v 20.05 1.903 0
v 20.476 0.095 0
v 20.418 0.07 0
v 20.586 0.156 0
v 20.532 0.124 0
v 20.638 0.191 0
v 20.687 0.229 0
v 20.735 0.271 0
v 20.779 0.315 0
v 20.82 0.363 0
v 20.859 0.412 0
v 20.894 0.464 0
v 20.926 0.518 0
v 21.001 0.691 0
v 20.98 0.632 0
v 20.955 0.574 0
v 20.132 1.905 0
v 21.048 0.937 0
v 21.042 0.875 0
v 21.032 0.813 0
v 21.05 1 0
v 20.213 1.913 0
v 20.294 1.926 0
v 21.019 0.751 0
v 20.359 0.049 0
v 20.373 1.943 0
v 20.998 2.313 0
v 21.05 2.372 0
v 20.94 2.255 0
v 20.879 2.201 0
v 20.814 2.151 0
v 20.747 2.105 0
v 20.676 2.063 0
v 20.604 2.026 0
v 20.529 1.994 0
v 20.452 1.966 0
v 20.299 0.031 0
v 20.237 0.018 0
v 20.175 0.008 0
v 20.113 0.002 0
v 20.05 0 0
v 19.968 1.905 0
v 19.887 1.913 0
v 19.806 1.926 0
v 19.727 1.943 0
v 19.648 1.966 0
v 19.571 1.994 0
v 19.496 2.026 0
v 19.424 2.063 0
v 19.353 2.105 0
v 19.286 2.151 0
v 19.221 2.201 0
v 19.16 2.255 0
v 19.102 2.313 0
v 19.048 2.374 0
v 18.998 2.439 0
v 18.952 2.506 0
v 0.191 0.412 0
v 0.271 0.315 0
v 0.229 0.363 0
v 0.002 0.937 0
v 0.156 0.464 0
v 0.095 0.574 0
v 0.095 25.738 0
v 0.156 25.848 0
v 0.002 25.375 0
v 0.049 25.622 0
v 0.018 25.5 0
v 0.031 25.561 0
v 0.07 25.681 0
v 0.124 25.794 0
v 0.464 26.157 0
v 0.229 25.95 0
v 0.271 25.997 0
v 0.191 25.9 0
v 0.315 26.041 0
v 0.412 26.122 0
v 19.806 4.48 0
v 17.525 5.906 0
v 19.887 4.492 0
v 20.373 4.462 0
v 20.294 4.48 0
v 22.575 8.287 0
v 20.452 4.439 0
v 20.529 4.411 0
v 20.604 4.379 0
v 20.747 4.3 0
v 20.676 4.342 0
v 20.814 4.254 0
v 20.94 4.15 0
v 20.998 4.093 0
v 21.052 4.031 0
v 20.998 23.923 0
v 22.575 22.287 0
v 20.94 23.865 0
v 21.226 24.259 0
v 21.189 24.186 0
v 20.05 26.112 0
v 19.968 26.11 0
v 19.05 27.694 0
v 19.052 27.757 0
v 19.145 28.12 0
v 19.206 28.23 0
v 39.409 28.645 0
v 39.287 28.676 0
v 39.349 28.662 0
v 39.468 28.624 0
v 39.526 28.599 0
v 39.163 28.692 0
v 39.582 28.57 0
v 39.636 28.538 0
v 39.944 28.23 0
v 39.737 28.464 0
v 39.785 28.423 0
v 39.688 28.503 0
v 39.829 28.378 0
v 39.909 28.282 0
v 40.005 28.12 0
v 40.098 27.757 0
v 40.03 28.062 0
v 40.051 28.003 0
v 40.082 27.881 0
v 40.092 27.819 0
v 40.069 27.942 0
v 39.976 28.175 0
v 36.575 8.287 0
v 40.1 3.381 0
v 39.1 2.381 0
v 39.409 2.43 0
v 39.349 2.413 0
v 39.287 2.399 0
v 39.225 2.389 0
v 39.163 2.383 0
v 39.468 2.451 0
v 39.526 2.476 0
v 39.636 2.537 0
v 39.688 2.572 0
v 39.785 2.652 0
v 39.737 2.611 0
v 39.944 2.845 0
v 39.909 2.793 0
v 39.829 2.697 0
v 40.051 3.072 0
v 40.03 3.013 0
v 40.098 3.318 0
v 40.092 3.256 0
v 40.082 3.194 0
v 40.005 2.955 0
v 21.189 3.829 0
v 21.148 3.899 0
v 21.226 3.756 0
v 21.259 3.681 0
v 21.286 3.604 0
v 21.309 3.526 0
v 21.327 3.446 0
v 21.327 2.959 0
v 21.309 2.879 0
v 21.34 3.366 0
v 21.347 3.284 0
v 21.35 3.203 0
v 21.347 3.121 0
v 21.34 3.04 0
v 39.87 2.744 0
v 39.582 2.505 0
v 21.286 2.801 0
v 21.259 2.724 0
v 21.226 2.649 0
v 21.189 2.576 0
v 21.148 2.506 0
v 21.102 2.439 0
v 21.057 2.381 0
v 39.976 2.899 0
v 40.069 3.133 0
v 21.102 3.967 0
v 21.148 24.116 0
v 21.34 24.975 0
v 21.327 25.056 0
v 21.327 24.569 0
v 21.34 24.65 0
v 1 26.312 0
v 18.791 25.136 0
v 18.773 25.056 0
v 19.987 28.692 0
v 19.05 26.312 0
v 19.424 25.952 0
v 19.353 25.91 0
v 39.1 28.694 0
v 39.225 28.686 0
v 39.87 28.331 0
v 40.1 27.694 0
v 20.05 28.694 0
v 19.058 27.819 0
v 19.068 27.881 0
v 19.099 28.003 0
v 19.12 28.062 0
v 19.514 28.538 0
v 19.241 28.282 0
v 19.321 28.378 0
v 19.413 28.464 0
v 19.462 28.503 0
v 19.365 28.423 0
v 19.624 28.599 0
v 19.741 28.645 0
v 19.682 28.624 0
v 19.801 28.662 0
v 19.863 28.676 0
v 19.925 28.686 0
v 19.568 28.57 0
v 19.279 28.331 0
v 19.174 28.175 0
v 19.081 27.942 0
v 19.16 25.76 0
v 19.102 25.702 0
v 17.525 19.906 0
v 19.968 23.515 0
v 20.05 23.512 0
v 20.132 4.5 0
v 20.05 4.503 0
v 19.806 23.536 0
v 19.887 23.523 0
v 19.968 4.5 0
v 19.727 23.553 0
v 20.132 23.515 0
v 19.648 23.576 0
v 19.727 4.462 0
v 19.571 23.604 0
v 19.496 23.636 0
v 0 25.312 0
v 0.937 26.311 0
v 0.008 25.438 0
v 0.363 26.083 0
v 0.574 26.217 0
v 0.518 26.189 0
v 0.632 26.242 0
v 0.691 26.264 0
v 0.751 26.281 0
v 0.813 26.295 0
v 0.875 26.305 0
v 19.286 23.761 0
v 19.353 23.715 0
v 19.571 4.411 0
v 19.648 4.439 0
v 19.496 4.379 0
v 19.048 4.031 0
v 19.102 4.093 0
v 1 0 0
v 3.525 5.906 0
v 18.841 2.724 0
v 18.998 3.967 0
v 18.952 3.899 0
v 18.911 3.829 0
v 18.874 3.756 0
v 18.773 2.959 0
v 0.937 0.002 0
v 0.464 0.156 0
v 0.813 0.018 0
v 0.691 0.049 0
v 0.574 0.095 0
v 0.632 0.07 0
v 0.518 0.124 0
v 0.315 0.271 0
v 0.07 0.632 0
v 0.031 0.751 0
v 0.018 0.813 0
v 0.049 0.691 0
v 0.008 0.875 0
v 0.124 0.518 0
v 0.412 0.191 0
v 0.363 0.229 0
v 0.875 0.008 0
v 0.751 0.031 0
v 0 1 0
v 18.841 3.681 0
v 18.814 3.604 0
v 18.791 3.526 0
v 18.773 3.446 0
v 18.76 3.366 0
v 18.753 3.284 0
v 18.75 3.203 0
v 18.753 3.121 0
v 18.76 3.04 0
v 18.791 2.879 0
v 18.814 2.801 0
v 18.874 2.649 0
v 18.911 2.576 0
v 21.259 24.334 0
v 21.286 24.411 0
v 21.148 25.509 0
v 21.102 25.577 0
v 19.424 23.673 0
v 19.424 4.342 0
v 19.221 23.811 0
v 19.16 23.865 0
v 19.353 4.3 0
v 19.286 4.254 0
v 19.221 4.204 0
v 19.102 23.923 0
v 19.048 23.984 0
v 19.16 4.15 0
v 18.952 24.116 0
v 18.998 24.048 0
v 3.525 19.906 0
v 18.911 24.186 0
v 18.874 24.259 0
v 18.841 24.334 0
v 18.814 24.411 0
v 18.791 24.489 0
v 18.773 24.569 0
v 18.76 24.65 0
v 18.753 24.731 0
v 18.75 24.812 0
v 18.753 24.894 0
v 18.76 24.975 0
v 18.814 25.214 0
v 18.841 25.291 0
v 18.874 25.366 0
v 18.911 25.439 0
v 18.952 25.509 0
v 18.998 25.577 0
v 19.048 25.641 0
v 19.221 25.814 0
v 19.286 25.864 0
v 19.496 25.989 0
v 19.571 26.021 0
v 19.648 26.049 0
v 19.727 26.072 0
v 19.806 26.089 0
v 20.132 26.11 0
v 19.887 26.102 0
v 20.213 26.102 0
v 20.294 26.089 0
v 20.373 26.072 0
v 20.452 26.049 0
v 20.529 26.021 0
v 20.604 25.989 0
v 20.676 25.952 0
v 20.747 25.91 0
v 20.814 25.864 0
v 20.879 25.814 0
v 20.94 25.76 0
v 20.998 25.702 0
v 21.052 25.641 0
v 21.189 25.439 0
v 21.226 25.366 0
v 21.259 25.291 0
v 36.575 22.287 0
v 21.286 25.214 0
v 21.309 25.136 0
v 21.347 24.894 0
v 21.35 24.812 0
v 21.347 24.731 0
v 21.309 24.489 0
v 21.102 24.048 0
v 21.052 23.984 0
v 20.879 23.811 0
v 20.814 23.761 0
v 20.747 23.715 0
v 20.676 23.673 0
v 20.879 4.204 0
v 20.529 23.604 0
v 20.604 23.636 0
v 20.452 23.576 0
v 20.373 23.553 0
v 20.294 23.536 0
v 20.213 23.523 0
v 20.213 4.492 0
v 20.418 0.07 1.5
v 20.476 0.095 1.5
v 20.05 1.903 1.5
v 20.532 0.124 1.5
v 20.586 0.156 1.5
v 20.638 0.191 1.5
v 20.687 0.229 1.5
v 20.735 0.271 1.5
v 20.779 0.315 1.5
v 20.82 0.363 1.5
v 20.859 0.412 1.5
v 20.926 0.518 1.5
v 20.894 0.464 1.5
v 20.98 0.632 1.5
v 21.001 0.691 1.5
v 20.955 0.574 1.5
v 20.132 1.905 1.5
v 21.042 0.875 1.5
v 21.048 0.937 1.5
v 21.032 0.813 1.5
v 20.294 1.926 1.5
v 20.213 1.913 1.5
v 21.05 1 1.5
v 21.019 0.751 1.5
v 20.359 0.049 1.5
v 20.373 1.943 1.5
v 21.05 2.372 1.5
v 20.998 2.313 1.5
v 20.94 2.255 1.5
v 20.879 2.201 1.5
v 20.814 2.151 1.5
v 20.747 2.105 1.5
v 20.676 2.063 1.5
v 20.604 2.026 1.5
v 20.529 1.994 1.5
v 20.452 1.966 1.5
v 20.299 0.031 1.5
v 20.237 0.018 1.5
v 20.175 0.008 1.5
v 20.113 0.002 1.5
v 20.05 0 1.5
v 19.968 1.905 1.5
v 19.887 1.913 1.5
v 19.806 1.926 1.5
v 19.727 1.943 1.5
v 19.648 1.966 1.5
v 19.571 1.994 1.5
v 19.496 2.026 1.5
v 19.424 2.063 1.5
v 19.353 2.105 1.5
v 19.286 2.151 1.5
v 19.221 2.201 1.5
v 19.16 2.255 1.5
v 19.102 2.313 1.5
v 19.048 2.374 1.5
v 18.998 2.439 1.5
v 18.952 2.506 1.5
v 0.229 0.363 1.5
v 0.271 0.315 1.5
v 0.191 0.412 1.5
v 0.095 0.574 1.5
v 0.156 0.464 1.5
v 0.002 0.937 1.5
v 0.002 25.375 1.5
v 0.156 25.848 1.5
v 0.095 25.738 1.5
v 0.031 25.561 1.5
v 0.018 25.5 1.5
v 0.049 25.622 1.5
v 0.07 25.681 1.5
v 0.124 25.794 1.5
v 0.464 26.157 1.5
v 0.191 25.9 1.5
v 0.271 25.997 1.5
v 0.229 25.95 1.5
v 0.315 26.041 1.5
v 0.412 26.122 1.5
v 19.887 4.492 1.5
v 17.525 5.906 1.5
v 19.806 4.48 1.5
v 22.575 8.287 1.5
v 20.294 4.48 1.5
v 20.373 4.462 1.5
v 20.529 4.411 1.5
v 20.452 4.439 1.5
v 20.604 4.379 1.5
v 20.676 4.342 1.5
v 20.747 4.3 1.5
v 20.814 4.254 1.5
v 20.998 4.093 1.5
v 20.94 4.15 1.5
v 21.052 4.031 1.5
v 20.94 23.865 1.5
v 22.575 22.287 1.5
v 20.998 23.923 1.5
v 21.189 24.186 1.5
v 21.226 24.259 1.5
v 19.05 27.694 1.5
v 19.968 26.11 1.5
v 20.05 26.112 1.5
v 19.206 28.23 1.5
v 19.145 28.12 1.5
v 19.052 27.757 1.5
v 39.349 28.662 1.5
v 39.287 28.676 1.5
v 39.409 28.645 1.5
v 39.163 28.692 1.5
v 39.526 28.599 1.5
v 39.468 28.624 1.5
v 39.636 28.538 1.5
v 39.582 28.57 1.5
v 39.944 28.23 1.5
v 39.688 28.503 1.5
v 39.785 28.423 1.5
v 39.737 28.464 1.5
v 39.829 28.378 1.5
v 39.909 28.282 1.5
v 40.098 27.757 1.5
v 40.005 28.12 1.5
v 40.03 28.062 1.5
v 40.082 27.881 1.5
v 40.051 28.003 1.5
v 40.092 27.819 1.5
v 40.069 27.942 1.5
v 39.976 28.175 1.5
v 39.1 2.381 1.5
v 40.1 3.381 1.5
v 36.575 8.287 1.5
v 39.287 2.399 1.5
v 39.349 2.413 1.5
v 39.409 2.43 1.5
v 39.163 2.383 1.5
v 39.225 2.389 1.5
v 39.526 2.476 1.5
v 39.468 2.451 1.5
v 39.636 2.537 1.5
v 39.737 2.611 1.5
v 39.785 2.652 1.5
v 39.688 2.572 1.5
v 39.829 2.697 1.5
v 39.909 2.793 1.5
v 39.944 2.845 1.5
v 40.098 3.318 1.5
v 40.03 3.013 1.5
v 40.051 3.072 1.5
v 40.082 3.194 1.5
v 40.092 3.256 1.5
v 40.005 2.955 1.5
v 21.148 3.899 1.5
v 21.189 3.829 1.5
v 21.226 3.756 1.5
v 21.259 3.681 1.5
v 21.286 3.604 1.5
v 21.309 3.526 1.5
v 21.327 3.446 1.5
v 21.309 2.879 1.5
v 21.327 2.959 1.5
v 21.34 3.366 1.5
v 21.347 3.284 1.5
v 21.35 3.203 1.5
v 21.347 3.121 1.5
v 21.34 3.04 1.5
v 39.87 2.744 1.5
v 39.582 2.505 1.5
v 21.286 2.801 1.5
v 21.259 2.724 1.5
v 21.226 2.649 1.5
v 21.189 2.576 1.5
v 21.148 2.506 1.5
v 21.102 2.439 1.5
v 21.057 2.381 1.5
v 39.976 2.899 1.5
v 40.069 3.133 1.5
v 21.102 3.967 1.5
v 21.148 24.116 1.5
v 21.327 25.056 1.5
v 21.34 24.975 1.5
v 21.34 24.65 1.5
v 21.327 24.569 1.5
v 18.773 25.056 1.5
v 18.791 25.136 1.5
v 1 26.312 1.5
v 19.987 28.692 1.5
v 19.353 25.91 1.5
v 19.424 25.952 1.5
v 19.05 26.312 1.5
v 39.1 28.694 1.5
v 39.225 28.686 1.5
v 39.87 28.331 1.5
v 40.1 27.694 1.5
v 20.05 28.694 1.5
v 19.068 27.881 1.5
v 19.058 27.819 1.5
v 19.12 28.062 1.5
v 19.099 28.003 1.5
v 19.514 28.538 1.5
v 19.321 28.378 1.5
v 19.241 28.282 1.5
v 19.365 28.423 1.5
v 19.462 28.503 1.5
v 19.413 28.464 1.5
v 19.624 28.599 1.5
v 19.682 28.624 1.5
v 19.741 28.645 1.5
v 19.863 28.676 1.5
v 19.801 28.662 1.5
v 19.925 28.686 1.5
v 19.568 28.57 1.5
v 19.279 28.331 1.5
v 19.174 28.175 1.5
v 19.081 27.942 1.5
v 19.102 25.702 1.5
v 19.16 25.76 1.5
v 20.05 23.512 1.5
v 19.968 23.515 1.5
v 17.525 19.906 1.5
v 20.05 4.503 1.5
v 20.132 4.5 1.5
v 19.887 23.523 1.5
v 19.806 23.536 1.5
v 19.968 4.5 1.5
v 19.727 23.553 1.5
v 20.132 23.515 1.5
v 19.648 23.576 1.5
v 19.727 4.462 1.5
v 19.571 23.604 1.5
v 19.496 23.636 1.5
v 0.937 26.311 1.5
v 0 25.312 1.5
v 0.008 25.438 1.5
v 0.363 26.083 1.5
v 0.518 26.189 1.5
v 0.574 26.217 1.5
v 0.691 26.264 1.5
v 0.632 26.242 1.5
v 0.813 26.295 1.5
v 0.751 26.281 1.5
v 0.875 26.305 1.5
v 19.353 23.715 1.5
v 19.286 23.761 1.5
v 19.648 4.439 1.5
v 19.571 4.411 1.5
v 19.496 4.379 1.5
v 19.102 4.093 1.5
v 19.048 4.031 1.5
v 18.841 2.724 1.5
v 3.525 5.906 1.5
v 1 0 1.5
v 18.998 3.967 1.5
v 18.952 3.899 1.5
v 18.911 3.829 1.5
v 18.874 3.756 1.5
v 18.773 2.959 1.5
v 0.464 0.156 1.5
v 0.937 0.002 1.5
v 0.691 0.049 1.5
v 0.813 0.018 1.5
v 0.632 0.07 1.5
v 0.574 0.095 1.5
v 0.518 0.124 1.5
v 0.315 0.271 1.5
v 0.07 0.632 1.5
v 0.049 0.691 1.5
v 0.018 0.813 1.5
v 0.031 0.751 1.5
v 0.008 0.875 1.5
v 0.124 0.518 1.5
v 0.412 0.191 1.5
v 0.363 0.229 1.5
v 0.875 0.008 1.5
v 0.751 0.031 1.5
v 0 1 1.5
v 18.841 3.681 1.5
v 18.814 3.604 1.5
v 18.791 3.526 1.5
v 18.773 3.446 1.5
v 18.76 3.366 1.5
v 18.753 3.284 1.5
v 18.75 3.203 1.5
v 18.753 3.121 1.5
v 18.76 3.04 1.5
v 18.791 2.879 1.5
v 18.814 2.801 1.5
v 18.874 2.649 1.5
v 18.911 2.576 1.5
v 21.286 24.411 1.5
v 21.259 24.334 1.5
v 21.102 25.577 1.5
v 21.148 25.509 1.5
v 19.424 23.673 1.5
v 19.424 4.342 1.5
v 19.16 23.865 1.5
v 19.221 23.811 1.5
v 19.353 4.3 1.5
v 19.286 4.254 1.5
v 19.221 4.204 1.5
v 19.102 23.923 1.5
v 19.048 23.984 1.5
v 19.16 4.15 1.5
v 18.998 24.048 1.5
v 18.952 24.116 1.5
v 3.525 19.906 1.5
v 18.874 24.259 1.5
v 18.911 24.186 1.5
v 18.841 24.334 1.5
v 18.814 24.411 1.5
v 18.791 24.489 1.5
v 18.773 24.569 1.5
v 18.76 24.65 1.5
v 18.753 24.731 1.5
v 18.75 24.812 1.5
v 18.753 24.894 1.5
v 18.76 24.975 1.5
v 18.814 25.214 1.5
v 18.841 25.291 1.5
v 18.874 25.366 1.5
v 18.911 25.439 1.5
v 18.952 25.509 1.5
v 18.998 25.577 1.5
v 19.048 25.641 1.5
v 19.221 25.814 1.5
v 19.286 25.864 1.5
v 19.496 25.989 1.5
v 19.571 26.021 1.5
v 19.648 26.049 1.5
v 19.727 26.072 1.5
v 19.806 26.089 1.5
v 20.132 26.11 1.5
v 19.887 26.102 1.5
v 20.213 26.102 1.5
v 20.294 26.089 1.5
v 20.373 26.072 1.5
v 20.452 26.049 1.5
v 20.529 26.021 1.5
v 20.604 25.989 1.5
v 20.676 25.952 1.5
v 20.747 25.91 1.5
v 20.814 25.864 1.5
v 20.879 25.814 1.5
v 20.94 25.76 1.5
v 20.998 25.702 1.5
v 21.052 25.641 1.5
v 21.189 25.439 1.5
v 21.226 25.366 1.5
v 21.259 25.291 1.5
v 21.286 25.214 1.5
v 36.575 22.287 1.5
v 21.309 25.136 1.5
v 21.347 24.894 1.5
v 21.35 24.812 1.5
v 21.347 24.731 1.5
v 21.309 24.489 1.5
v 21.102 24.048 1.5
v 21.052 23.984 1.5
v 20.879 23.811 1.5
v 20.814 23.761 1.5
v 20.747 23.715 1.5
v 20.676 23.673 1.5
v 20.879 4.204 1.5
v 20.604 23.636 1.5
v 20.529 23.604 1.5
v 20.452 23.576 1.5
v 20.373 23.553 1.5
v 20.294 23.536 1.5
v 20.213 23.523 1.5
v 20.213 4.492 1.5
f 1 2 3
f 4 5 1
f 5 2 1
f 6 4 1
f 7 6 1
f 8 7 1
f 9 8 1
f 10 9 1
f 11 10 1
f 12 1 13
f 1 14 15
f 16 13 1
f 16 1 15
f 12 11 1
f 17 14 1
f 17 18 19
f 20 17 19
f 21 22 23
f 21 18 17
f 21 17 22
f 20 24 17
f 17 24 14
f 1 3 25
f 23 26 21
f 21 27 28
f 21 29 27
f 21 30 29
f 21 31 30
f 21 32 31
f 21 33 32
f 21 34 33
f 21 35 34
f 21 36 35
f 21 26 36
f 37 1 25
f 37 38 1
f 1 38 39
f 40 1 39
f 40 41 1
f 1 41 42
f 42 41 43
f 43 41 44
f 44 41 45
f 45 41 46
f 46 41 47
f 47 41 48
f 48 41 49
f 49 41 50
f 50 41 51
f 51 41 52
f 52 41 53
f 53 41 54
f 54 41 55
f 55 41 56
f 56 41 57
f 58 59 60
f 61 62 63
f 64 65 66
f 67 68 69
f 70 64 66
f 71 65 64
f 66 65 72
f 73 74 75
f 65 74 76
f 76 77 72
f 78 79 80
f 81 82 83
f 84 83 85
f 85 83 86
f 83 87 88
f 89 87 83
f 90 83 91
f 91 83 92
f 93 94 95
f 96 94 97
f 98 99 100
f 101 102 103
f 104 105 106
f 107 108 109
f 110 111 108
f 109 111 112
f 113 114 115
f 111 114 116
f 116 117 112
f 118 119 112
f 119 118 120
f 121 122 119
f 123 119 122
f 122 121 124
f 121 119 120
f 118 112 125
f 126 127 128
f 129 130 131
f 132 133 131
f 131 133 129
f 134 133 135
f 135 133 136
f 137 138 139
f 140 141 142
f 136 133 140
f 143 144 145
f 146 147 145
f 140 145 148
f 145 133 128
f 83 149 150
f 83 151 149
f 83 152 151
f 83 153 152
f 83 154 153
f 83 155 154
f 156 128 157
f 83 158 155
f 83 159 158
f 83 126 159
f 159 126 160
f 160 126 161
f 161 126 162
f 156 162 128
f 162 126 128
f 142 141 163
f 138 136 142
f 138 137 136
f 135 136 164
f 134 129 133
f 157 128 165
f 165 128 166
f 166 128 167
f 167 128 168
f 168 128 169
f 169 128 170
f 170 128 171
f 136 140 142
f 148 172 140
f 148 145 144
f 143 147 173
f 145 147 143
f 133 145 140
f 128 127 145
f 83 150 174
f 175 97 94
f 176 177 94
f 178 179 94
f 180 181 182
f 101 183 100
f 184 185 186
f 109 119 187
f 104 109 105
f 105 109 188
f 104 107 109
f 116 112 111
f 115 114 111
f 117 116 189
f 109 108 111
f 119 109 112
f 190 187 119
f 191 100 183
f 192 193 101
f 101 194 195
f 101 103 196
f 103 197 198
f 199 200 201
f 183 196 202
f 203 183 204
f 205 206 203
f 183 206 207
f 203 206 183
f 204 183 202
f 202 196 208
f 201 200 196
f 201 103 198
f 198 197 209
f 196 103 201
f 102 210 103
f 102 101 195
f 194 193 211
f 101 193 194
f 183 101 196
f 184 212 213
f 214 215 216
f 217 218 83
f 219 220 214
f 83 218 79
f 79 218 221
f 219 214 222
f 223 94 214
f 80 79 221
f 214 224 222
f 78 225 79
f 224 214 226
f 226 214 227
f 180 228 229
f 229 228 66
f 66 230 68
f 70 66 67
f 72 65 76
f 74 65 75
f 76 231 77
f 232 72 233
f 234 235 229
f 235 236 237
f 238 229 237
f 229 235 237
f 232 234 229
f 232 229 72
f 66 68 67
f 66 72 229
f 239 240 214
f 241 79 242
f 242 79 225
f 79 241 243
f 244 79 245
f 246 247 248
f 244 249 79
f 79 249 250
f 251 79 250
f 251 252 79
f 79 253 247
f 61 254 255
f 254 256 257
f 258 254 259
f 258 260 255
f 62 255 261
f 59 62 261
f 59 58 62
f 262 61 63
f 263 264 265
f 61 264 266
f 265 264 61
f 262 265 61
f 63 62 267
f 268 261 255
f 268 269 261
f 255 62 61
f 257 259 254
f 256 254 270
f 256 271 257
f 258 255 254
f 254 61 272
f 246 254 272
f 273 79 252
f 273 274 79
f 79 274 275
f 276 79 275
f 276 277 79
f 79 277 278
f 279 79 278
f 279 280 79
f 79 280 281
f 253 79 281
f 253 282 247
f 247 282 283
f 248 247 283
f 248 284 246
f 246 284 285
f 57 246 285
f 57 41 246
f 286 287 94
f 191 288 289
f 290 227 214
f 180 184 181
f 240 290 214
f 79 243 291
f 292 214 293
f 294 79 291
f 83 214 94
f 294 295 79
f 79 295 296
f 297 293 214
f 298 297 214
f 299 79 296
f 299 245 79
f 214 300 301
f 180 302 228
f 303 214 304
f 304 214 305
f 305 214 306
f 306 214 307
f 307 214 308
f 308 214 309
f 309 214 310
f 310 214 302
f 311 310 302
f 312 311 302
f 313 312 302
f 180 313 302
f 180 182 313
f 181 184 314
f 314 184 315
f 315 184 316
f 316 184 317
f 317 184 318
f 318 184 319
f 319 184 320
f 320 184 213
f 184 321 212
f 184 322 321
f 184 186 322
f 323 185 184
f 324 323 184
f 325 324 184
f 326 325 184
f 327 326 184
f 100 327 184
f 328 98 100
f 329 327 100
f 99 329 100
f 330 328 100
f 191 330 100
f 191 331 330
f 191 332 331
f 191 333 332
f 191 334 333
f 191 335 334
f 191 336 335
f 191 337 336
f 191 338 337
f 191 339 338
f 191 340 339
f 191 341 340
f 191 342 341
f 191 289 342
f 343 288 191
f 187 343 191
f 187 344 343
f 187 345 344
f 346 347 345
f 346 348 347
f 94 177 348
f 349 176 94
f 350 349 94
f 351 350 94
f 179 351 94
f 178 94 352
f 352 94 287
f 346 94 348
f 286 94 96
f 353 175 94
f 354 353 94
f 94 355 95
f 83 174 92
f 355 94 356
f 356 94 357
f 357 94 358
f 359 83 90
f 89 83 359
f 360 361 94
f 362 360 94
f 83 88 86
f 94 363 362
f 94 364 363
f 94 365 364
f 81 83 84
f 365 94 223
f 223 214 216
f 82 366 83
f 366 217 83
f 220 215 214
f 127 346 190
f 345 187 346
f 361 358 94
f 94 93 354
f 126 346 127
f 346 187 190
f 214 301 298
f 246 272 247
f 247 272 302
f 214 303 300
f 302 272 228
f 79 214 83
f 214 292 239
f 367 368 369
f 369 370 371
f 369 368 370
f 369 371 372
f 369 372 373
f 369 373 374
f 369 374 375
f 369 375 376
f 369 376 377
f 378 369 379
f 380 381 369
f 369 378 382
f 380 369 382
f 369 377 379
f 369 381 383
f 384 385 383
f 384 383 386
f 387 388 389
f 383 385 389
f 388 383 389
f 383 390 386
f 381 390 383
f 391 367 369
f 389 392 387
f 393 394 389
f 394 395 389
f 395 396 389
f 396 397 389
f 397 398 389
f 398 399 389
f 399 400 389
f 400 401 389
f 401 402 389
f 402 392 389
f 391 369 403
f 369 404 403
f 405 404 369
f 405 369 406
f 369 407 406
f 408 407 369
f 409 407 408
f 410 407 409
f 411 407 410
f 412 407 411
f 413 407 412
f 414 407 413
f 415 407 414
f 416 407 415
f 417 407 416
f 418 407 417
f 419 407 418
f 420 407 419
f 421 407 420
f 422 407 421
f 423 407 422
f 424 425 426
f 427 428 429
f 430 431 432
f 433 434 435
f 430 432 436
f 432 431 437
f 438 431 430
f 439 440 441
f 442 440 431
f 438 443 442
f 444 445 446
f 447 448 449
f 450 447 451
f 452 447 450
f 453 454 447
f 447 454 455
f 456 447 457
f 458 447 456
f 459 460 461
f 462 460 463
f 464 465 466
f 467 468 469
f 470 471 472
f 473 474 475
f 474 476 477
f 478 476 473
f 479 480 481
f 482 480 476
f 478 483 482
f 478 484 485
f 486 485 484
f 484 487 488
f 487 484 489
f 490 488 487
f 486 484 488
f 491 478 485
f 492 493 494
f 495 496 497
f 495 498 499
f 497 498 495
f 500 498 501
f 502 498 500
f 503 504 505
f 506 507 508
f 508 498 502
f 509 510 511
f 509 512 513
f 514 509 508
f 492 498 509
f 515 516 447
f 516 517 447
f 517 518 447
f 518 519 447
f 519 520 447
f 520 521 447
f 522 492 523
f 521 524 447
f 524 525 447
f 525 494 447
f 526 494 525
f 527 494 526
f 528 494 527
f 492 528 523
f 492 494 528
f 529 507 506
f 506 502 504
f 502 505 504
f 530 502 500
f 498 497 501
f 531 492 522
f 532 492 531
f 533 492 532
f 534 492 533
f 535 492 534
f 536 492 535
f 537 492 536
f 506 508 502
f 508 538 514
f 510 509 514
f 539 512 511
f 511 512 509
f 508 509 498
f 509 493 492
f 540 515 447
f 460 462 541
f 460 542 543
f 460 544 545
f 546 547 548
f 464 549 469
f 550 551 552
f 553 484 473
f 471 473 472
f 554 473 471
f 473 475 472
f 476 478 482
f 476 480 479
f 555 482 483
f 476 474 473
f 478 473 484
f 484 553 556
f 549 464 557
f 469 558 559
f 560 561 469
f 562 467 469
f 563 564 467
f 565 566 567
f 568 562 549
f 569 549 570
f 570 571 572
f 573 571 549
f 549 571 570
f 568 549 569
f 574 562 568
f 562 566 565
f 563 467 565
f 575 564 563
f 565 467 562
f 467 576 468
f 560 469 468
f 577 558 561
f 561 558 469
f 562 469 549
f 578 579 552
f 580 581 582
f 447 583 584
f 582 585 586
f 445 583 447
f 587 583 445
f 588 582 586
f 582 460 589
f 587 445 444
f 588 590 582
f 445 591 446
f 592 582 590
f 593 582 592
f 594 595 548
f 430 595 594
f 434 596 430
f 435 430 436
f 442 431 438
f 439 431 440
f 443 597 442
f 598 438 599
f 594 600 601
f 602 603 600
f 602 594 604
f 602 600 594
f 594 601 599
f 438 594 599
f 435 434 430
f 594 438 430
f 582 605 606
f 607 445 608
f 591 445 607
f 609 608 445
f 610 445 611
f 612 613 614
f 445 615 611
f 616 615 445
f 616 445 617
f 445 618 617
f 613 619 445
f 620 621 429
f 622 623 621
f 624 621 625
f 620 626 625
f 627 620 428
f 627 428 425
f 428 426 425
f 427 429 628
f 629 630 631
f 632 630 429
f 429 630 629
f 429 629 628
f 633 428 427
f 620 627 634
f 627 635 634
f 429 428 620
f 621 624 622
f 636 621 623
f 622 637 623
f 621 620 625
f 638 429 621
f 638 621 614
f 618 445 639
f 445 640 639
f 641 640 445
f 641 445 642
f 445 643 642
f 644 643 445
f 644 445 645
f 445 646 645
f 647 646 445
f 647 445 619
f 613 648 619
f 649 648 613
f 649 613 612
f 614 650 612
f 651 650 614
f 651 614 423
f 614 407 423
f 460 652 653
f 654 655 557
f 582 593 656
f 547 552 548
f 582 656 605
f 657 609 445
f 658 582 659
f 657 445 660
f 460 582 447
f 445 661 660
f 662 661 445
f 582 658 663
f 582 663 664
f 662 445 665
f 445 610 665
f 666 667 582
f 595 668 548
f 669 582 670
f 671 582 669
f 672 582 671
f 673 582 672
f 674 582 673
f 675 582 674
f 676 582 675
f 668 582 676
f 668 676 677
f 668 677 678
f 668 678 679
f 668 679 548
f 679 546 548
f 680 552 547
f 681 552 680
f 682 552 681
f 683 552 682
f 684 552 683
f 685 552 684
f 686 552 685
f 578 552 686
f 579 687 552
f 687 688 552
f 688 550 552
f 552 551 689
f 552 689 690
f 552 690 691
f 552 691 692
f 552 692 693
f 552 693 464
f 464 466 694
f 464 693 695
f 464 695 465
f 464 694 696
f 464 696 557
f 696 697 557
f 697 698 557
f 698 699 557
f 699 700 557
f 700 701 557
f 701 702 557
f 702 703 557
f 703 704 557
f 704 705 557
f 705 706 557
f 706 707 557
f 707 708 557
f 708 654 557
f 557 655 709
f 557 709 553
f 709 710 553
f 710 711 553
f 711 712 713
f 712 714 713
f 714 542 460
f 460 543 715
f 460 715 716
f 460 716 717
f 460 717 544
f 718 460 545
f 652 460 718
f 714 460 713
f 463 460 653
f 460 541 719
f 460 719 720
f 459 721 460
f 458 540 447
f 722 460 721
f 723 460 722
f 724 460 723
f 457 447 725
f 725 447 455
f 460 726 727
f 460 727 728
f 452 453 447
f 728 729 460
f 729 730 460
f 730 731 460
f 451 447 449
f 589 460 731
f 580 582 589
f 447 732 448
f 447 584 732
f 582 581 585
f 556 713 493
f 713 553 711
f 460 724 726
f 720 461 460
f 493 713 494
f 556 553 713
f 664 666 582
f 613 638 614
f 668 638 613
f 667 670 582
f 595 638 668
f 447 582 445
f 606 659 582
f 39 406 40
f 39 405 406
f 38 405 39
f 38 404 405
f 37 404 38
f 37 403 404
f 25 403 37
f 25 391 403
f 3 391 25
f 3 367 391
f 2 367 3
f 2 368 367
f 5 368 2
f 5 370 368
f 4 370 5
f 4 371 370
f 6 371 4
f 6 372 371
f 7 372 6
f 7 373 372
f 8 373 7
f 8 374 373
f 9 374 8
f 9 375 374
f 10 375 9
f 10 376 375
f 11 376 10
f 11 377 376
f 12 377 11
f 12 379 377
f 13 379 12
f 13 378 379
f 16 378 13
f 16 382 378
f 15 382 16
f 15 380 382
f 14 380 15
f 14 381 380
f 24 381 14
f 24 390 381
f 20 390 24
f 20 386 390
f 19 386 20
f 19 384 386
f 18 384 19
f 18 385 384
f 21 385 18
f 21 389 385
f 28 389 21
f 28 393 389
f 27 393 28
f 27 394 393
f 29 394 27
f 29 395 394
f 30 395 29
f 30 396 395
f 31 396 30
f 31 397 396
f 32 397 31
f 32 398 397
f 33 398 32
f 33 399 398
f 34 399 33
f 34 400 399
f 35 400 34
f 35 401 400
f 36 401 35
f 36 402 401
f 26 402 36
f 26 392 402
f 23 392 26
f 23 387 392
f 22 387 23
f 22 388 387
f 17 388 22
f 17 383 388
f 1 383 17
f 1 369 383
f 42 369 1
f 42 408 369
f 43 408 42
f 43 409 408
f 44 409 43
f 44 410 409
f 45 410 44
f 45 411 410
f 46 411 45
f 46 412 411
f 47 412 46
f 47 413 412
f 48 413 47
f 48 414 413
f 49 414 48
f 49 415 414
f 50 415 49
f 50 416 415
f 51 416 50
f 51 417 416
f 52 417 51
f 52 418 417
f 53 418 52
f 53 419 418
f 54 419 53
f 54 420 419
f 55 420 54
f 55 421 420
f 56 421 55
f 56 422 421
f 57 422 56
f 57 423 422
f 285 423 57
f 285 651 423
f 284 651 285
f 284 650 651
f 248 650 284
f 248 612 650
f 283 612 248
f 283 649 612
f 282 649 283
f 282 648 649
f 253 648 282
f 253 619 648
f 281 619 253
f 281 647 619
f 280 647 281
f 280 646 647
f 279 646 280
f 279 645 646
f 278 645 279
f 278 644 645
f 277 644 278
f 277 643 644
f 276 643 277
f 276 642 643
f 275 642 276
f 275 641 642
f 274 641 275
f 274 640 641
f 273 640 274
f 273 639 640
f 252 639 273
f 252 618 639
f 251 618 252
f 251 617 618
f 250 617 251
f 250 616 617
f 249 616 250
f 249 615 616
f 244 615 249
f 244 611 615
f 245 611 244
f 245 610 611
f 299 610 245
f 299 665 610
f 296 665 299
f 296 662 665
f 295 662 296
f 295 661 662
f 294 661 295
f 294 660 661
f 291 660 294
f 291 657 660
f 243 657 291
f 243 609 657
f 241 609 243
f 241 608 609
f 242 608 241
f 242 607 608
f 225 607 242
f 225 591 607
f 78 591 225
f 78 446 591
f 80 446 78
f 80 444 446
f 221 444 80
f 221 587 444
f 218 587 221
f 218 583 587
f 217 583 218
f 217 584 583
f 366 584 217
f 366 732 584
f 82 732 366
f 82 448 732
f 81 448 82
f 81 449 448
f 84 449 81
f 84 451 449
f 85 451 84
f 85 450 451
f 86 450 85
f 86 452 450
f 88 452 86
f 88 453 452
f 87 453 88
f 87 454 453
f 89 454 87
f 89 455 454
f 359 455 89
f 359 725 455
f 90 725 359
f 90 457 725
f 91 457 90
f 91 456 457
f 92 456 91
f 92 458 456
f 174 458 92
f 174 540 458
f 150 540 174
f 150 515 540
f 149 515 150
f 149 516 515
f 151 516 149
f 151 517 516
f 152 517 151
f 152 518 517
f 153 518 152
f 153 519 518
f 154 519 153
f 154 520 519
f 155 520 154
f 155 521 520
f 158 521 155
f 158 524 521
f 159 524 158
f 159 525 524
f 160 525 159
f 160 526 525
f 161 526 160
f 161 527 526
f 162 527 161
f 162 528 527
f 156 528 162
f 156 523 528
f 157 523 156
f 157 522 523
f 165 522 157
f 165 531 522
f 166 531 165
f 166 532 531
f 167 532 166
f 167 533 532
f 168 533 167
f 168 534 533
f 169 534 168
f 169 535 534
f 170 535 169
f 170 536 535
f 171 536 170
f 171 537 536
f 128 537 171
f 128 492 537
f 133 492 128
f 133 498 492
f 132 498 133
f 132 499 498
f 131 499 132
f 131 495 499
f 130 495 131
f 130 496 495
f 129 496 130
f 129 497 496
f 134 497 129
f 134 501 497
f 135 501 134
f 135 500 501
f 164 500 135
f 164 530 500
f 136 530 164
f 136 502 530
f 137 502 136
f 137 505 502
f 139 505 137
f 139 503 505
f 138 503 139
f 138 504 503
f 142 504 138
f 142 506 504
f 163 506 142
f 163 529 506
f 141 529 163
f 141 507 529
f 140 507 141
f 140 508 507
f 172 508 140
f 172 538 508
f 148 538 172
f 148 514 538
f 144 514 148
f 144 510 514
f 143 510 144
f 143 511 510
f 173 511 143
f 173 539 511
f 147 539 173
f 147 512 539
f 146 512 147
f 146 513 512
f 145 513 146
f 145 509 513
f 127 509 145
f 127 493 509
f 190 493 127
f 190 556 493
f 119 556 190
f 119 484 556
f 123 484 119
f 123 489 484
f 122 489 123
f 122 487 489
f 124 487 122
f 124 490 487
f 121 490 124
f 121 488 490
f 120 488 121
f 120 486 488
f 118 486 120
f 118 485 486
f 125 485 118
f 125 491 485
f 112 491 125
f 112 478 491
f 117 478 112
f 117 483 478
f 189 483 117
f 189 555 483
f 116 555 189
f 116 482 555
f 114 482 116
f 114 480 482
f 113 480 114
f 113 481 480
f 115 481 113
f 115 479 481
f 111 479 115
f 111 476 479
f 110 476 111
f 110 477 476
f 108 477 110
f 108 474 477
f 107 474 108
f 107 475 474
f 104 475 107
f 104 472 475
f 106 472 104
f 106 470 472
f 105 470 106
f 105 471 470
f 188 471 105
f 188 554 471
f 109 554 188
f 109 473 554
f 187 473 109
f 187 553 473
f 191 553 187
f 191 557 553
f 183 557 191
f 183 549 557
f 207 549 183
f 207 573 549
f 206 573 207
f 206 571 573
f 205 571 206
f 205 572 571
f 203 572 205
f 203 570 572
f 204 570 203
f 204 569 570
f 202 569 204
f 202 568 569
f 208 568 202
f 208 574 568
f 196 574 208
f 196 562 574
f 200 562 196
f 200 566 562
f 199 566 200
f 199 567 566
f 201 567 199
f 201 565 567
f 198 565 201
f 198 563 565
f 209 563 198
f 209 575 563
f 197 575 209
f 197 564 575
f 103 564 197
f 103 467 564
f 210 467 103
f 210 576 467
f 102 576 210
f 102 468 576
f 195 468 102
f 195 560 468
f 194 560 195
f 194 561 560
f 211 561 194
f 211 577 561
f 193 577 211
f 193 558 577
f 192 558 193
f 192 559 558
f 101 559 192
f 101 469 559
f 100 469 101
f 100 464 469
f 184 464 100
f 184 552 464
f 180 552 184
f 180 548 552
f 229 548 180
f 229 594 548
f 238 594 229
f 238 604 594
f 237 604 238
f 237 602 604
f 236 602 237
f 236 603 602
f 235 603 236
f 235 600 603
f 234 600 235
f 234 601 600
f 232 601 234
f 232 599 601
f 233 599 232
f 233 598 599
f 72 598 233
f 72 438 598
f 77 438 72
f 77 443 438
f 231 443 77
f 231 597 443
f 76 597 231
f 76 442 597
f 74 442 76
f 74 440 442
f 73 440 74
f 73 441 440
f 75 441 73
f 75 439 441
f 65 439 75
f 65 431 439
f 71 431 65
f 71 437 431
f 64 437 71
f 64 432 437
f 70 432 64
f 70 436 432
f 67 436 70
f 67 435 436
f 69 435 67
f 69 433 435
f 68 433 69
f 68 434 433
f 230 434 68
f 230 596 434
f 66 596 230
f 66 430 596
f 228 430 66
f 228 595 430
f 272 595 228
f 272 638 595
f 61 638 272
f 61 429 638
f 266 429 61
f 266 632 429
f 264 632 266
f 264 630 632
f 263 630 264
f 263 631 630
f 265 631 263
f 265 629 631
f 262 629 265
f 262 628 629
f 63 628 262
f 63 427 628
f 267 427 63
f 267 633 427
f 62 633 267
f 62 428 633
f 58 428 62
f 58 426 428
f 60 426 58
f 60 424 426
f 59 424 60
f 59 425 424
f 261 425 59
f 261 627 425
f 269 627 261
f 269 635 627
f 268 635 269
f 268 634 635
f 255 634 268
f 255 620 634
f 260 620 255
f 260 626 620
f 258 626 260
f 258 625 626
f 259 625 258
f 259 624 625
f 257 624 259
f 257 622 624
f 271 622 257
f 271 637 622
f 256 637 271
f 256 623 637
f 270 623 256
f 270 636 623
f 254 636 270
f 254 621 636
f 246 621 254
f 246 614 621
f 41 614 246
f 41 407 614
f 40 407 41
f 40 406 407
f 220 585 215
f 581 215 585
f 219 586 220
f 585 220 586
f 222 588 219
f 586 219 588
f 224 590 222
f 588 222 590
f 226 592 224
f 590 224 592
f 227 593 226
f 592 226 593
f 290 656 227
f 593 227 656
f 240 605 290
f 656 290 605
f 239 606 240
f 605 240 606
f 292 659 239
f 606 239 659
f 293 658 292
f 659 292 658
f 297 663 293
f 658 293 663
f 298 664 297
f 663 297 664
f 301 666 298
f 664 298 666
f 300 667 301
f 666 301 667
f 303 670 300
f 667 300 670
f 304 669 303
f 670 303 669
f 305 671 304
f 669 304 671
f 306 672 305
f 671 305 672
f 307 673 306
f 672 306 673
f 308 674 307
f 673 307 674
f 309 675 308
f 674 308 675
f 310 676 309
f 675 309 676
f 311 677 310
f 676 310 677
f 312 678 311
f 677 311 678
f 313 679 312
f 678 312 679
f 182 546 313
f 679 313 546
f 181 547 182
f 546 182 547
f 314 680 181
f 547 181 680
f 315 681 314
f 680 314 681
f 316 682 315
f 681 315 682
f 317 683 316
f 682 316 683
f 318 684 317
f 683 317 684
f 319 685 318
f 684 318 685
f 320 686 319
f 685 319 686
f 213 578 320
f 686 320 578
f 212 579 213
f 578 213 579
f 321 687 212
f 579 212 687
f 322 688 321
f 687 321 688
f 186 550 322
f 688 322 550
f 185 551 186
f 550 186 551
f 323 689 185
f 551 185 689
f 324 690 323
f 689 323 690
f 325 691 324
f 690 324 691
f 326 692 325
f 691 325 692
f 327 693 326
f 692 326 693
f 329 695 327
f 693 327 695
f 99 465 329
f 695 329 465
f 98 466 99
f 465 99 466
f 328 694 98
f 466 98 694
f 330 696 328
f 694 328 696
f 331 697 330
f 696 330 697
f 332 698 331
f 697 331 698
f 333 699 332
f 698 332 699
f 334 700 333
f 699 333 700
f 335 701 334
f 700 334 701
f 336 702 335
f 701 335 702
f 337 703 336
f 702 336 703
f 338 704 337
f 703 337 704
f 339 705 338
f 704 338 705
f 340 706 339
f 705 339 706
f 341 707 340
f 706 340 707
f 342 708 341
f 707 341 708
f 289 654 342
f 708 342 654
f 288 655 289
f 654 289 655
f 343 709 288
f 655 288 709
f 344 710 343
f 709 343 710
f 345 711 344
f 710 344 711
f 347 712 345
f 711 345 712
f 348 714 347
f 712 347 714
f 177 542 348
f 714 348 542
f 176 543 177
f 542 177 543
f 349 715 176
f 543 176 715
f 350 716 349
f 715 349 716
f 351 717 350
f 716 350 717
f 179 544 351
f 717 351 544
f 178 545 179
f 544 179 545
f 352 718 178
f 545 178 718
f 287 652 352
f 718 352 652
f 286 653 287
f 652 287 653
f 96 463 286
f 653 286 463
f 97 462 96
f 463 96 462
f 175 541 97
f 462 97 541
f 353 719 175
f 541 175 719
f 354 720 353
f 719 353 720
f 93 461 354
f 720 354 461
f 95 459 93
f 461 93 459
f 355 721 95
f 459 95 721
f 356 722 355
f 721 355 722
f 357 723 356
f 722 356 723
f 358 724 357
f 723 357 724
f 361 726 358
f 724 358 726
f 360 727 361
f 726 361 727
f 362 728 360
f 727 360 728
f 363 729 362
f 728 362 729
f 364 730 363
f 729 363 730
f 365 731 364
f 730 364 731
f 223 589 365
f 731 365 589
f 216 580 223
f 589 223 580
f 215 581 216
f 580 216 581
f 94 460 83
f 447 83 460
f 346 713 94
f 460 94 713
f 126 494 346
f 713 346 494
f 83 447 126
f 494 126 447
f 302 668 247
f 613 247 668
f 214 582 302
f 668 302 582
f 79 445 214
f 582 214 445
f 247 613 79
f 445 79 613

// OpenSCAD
// file: ../modules/shapes.scad
// draws a square with rounded corners
module squircle(
    size = [1,1],
    radius = 1,
    center = false){
    
    x = size[0];
    y = size[1];
    radius = min(x/2,min(y/2, radius));
    translation = [0,0];
        
    module corner(){
            intersection(){
                square([radius,radius]);
                translate([radius, radius])
                    circle(radius);
            }
    }
    
    module body(){
    
        corner();
        
        translate([0, y])        
            rotate([0,0,-90])
                corner();
        
        translate([x, y])        
            rotate([0,0,180])
                corner();
        
        translate([x, 0])        
            rotate([0,0, 90])
                corner();
        
        translate([radius, 0])
            square([x - 2 * radius, radius]);
        
        translate([0, radius])
            square([x, y - radius * 2]);
            
        translate([radius, y - radius])
            square([x - 2 * radius, radius]);
    }
    
    if(center)
        translate([-x/2, -y/2])
            body();
    else
        body();
}
// file: ../modules/keycap.scad
use <shapes.scad>

// draws a rough no-profile at keycap 0,0 1U space
module keycap(keyHeight = 1.0){
  
    1U = 19.05;
    width = 18;
    depth = 18 * keyHeight;
    height = 9;

    translate([1U/2, 1U/2, 7])
        linear_extrude(height, scale = [0.7,0.7])
          squircle([width, depth], 1, center = true);	
}

keycap($fn = 100);
// file: ../modules/switch.scad
use <shapes.scad>;

// draws a rough Cherry MX style switch at 0,0 1U space
module switch(){
    
    ringWidth = 15.6;
    ringHeight = 1.0;

    bottomTopWidth = 14.0;
    bottomBottomWidth = 12.0;
    bottomHeight = 5.0;

    topBottomWidth = 14.5;
    topTopWidth = 10;
    topHeight = 11.6 - bottomHeight - ringHeight;

    module switch_stem(){

        width = 3.6;
        height = 3.6;
        depth = 1.2;
        edgeRadius = 0.2;

		color("FireBrick",1)
            translate([0,0, ringHeight + topHeight])
                linear_extrude(height = height){
                    squircle([width, depth], edgeRadius, true);
                    rotate([0,0,90])
                        squircle([width, depth], edgeRadius, true);
                }
    }

    module switch_top(){
		color("WhiteSmoke",1)
            translate([0,0,ringHeight])
                linear_extrude(topHeight, scale = topTopWidth / topBottomWidth)
                    translate([-topBottomWidth/2,-topBottomWidth/2,0])
                        squircle([topBottomWidth,topBottomWidth], 1.0);
    }
                    
    module switch_middle(){
		color("WhiteSmoke",1)
            linear_extrude(ringHeight)
                squircle([ringWidth, ringWidth], 1.0, center = true);
    }

    module switch_bottom(){
		color("WhiteSmoke",1)
            translate([0,0,-bottomHeight])
                linear_extrude(bottomHeight, scale = bottomTopWidth / bottomBottomWidth)
                    translate([-bottomBottomWidth/2,-bottomBottomWidth/2,0])
                        squircle([bottomBottomWidth,bottomBottomWidth], 1.0);
    }

    translate([19.05/2,19.05/2,0]){
        switch_stem();
        switch_top();
        switch_middle();
        switch_bottom();
    }
}

switch();
// file: ../modules/bearingMount.scad
include <../config.scad>;
use <./plate.scad>;

module hole(){

    linear_extrude(BEARING_BOLT_CLEARANCE_Z)
        boltHole();

    translate([0,0, BEARING_BOLT_CLEARANCE_Z])
        linear_extrude(BEARING_MOUNT_HEIGHT)
            circle(d = BOLT_TOP_DIAMETER + BOLT_TOLERENCE * 2);
}

module bearingMount(){

    trackballRadius = getTrackballHoleRadius();
    ringWidthBottom = PLATE_BEZEL + (1U - SWITCH_WIDTH) * 0.5;
    
    difference(){
        
        union(){

            rotate_extrude(convexity = 10)
                minkowski(){
                    polygon([
                        [trackballRadius + BEARING_MOUNT_TOP_CURVE_RADIUS,0],
                        [trackballRadius + ringWidthBottom - BEARING_MOUNT_TOP_CURVE_RADIUS, 0],
                        [trackballRadius - BEARING_MOUNT_TOP_CURVE_RADIUS + BEARING_MOUNT_TOP_X_MAX, BEARING_MOUNT_HEIGHT - BEARING_MOUNT_TOP_CURVE_RADIUS],
                        [trackballRadius + BEARING_MOUNT_TOP_CURVE_RADIUS + BEARING_MOUNT_TOP_X_MIN, BEARING_MOUNT_HEIGHT - BEARING_MOUNT_TOP_CURVE_RADIUS],
                    ]);
                    
                    difference(){
                        circle(r = BEARING_MOUNT_TOP_CURVE_RADIUS);
                        translate([-BEARING_MOUNT_TOP_CURVE_RADIUS, -BEARING_MOUNT_TOP_CURVE_RADIUS * 2])
                            square([BEARING_MOUNT_TOP_CURVE_RADIUS * 2, BEARING_MOUNT_TOP_CURVE_RADIUS * 2]);
                    }
                }
        }

        // bearing holes

        bearingOffsetXY = 
            sqrt(
                (TRACKBALL_DIAMETER * TRACKBALL_DIAMETER) / 4 -
                ((BEARING_OFFSET_Z + PLATE_THICKNESS) * (BEARING_OFFSET_Z + PLATE_THICKNESS)))
                + BEARING_DIAMETER * 0.5;

        translate([0,0, BEARING_OFFSET_Z])
            for (i = [0:2]) {
                
                angle = 120 * i;

                translate([cos(angle), sin(angle), 0] * bearingOffsetXY){
                    rotate([0, 0, angle])                
                        sphere(d = BEARING_DIAMETER);
                }
            }
            
        // standoff holes

        translate([0, TRACKBALL_PCB_MOUNT_OFFSET])
            hole();

        translate([0, -TRACKBALL_PCB_MOUNT_OFFSET])
            hole();
        
    }
}

bearingMount($fn = 100);
// file: ../modules/keys.scad
include <../config.scad>;
use <./plate.scad>;
use <./bearingMount.scad>;
use <./switch.scad>;
use <./keycap.scad>;

// draws 3D keycaps and trackballs with the given positions in 1U space
module keys(
    keyPositions = [],
    keyHeight = 1.0){
        
    for(keyPosition = keyPositions)
        translate([keyPosition.x, keyPosition.y * keyHeight] * 1U + [PLATE_BEZEL,PLATE_BEZEL])
        
            if(keyPosition.z == "trackball")
                translate([0.5, 0.5 * keyHeight, 0] * 1U){
                    
                    translate([0, 0, getTrackballZ()])
                        sphere(d = TRACKBALL_DIAMETER);
                    
                    translate([0, TRACKBALL_PCB_MOUNT_OFFSET, -STANDOFF_HEIGHT])
                        cylinder(r = BOLT_DIAMETER, h = STANDOFF_HEIGHT);
                    
                    translate([0, -TRACKBALL_PCB_MOUNT_OFFSET, -STANDOFF_HEIGHT])
                        cylinder(r = BOLT_DIAMETER, h = STANDOFF_HEIGHT);

                    translate([0, 0, -STANDOFF_HEIGHT - TRACKBALL_PCB_THICKNESS])
                        cylinder(d = TRACKBALL_PCB_DIAMETER, h = TRACKBALL_PCB_THICKNESS);

                    translate([0,0, PLATE_THICKNESS])
                        bearingMount();
                }

            else
                translate([0,  (keyHeight - 1) * 1U * 0.5, PLATE_THICKNESS]){
                    keycap(keyHeight);
                    switch();
                }
}

keys(FINGER_GRID, $fn = 100);
// file: ../modules/plate.scad
include <../config.scad>;

function getTrackballZ() = 
    PLATE_THICKNESS +
    -STANDOFF_HEIGHT +
    TRACKBALL_LENS_HEIGHT_ABOVE_BOARD +
    TRACKBALL_LENS_CLEARANCE +
    TRACKBALL_DIAMETER * 0.5;
    
function getTrackballHoleRadius() =
    sqrt(
        (TRACKBALL_DIAMETER * TRACKBALL_DIAMETER) / 4 -
        getTrackballZ() * getTrackballZ())
        + TRACKBALL_PLATE_CLEARANCE;

// draws a 2D circle representing a bolt hole
module boltHole(){
    circle(d = BOLT_DIAMETER + BOLT_TOLERENCE * 2);
}

// draws a 2D plate with the given key positions in 1U space
module plate(
    keyPositions = [],
    keyHeight = 1.0,
    boltPositions = [],
    cutSwitchHoles = true,
    hull = false){

    module solidPlate(){
        offset(delta = -PLATE_CURVE_RADIUS)
            for(keyPosition = keyPositions)
                translate([keyPosition.x, keyPosition.y * keyHeight] * 1U)

                    if(keyPosition.z == "trackball")
                        translate([0.5, 0.5 * keyHeight] * 1U + [PLATE_BEZEL,PLATE_BEZEL])
                            offset(r = PLATE_BEZEL + (1U - SWITCH_WIDTH) * 0.5)
                                circle(r = getTrackballHoleRadius());

                    else
                        square([1, keyHeight] * (1U + PLATE_BEZEL * 2));
    }

    difference(){
        
        // outline
        minkowski() {
            if(hull)
                hull()
                    solidPlate();
            else
                solidPlate();
            
            circle(r = PLATE_CURVE_RADIUS);
        }
        
        // cutouts
        translate([PLATE_BEZEL, PLATE_BEZEL]){

            if(cutSwitchHoles)
                for(keyPosition = keyPositions)
                    translate([keyPosition.x + 0.5, (keyPosition.y + 0.5) * keyHeight] * 1U)

                    if(keyPosition.z == "trackball")
                        circle(r = getTrackballHoleRadius());
                    else
                        translate(-[SWITCH_WIDTH, SWITCH_WIDTH] * 0.5)
                            square([SWITCH_WIDTH,SWITCH_WIDTH]);                        

            for(keyPosition = keyPositions)
                if(keyPosition.z == "trackball")
                    translate([keyPosition.x + 0.5, (keyPosition.y + 0.5) * keyHeight] * 1U){
                        translate([0, TRACKBALL_PCB_MOUNT_OFFSET, 0])
                            boltHole();
                        translate([0, -TRACKBALL_PCB_MOUNT_OFFSET, 0])
                            boltHole();
                    }

            for(boltPosition = boltPositions)
                translate([boltPosition.x, boltPosition.y * keyHeight] * 1U)
                    boltHole();
        }
    }
}

plate(
    keyPositions = FINGER_GRID,
    keyHeight = 1.0,
    boltPositions = FINGER_BOLT_HOLES,
    cutSwitchHoles = true,
    $fn = 100);
// file: ../config.scad
// draw flags

DRAW_DEBUG = false;

// MX constants

1U = 19.05;
SWITCH_WIDTH = 14;

// hardware

NUT_DIAMETER = 4;
NUT_TOLERENCE = 0.5;
BOLT_DIAMETER = 2.4; // M2 cleanance
BOLT_TOLERENCE = 0.1;
BOLT_TOP_DIAMETER = 3.8; // TODO: measure
STANDOFF_HEIGHT = 10;
BEARING_DIAMETER = 3.175;

// plate

PLATE_THICKNESS = 1.5;
PLATE_BEZEL = 1;
PLATE_CURVE_RADIUS = 1;

// trackball

TRACKBALL_DIAMETER = 24.9;
TRACKBALL_PLATE_CLEARANCE = 1.5;
TRACKBALL_LENS_CLEARANCE = 2.4; // from ADNS9800 data sheet
TRACKBALL_LENS_HEIGHT_ABOVE_BOARD = 1.5;// TODO: measure
TRACKBALL_PCB_MOUNT_OFFSET = 13.5;
TRACKBALL_PCB_DIAMETER = 32;
TRACKBALL_PCB_THICKNESS = 1.5;

// bearing mount

BEARING_OFFSET_Z = 2.5;
BEARING_MOUNT_TOP_CURVE_RADIUS = 0.5;
BEARING_MOUNT_TOP_X_MIN = 2.5;
BEARING_MOUNT_TOP_X_MAX = 4.0;
BEARING_MOUNT_HEIGHT = 4.5;
BEARING_BOLT_CLEARANCE_Z = 1;

// PCB

PCB_PLATE_OFFSET_Z = 5;
PCB_THICKNESS = 1.5;
PCB_UNDERSIDE_CLEARANCE = 3;

// case

CASE_PLATE_BEZEL = 1;
CASE_PLATE_TOLERENCE = 0.25;
CASE_CURVE_RADIUS = 1;
CASE_PLATE_MOUNT_COVERAGE = 1;

// layouts in 1U space

FINGER_GRID = 
    [[0, 2], [1, 2], [2, 2.25], [3, 2.37], [4, 2.25], [5, 2.12],
     [0, 1], [1, 1], [2, 1.25], [3, 1.37], [4, 1.25], [5, 1.12],
     [0, 0], [1, 0], [2, 0.25], [3, 0.37], [4, 0.25], [5, 0.12]];

FINGER_BOLT_HOLES =
    [[1, 2], [5, 2.185],
     [1, 1], [5, 1.185]];

THUMB_GRID = [[0, 0], [1, 0.1]];

THUMB_BOLT_HOLES = 
    [[1, 1],
     [1, 0.0925]];

THUMB_TRACKBALL_GRID = [[0, 0], [1.36, 0, "trackball"]];

THUMB_TRACKBALL_BOLT_HOLES = 
    [[1, 0.9075],
     [1, 0.0925]];

// plane rotations

HAND_ROTATION = [0, -12, 3];
THUMB_ROTATION = [10, -2, -10.25];
THUMB_OFFSET = [80.5, -22, 13.5];
// main file
include <../config.scad>;
use <../modules/plate.scad>;
use <../modules/keys.scad>;

linear_extrude(PLATE_THICKNESS)
    plate(
        keyPositions = THUMB_GRID,
        keyHeight = 1.25,
        boltPositions = THUMB_BOLT_HOLES,
        cutSwitchHoles = true,
        $fn = 100);
    
if(DRAW_DEBUG)
    %keys(
        keyPositions = THUMB_GRID,
        keyHeight = 1.25,
        $fn = 50);
